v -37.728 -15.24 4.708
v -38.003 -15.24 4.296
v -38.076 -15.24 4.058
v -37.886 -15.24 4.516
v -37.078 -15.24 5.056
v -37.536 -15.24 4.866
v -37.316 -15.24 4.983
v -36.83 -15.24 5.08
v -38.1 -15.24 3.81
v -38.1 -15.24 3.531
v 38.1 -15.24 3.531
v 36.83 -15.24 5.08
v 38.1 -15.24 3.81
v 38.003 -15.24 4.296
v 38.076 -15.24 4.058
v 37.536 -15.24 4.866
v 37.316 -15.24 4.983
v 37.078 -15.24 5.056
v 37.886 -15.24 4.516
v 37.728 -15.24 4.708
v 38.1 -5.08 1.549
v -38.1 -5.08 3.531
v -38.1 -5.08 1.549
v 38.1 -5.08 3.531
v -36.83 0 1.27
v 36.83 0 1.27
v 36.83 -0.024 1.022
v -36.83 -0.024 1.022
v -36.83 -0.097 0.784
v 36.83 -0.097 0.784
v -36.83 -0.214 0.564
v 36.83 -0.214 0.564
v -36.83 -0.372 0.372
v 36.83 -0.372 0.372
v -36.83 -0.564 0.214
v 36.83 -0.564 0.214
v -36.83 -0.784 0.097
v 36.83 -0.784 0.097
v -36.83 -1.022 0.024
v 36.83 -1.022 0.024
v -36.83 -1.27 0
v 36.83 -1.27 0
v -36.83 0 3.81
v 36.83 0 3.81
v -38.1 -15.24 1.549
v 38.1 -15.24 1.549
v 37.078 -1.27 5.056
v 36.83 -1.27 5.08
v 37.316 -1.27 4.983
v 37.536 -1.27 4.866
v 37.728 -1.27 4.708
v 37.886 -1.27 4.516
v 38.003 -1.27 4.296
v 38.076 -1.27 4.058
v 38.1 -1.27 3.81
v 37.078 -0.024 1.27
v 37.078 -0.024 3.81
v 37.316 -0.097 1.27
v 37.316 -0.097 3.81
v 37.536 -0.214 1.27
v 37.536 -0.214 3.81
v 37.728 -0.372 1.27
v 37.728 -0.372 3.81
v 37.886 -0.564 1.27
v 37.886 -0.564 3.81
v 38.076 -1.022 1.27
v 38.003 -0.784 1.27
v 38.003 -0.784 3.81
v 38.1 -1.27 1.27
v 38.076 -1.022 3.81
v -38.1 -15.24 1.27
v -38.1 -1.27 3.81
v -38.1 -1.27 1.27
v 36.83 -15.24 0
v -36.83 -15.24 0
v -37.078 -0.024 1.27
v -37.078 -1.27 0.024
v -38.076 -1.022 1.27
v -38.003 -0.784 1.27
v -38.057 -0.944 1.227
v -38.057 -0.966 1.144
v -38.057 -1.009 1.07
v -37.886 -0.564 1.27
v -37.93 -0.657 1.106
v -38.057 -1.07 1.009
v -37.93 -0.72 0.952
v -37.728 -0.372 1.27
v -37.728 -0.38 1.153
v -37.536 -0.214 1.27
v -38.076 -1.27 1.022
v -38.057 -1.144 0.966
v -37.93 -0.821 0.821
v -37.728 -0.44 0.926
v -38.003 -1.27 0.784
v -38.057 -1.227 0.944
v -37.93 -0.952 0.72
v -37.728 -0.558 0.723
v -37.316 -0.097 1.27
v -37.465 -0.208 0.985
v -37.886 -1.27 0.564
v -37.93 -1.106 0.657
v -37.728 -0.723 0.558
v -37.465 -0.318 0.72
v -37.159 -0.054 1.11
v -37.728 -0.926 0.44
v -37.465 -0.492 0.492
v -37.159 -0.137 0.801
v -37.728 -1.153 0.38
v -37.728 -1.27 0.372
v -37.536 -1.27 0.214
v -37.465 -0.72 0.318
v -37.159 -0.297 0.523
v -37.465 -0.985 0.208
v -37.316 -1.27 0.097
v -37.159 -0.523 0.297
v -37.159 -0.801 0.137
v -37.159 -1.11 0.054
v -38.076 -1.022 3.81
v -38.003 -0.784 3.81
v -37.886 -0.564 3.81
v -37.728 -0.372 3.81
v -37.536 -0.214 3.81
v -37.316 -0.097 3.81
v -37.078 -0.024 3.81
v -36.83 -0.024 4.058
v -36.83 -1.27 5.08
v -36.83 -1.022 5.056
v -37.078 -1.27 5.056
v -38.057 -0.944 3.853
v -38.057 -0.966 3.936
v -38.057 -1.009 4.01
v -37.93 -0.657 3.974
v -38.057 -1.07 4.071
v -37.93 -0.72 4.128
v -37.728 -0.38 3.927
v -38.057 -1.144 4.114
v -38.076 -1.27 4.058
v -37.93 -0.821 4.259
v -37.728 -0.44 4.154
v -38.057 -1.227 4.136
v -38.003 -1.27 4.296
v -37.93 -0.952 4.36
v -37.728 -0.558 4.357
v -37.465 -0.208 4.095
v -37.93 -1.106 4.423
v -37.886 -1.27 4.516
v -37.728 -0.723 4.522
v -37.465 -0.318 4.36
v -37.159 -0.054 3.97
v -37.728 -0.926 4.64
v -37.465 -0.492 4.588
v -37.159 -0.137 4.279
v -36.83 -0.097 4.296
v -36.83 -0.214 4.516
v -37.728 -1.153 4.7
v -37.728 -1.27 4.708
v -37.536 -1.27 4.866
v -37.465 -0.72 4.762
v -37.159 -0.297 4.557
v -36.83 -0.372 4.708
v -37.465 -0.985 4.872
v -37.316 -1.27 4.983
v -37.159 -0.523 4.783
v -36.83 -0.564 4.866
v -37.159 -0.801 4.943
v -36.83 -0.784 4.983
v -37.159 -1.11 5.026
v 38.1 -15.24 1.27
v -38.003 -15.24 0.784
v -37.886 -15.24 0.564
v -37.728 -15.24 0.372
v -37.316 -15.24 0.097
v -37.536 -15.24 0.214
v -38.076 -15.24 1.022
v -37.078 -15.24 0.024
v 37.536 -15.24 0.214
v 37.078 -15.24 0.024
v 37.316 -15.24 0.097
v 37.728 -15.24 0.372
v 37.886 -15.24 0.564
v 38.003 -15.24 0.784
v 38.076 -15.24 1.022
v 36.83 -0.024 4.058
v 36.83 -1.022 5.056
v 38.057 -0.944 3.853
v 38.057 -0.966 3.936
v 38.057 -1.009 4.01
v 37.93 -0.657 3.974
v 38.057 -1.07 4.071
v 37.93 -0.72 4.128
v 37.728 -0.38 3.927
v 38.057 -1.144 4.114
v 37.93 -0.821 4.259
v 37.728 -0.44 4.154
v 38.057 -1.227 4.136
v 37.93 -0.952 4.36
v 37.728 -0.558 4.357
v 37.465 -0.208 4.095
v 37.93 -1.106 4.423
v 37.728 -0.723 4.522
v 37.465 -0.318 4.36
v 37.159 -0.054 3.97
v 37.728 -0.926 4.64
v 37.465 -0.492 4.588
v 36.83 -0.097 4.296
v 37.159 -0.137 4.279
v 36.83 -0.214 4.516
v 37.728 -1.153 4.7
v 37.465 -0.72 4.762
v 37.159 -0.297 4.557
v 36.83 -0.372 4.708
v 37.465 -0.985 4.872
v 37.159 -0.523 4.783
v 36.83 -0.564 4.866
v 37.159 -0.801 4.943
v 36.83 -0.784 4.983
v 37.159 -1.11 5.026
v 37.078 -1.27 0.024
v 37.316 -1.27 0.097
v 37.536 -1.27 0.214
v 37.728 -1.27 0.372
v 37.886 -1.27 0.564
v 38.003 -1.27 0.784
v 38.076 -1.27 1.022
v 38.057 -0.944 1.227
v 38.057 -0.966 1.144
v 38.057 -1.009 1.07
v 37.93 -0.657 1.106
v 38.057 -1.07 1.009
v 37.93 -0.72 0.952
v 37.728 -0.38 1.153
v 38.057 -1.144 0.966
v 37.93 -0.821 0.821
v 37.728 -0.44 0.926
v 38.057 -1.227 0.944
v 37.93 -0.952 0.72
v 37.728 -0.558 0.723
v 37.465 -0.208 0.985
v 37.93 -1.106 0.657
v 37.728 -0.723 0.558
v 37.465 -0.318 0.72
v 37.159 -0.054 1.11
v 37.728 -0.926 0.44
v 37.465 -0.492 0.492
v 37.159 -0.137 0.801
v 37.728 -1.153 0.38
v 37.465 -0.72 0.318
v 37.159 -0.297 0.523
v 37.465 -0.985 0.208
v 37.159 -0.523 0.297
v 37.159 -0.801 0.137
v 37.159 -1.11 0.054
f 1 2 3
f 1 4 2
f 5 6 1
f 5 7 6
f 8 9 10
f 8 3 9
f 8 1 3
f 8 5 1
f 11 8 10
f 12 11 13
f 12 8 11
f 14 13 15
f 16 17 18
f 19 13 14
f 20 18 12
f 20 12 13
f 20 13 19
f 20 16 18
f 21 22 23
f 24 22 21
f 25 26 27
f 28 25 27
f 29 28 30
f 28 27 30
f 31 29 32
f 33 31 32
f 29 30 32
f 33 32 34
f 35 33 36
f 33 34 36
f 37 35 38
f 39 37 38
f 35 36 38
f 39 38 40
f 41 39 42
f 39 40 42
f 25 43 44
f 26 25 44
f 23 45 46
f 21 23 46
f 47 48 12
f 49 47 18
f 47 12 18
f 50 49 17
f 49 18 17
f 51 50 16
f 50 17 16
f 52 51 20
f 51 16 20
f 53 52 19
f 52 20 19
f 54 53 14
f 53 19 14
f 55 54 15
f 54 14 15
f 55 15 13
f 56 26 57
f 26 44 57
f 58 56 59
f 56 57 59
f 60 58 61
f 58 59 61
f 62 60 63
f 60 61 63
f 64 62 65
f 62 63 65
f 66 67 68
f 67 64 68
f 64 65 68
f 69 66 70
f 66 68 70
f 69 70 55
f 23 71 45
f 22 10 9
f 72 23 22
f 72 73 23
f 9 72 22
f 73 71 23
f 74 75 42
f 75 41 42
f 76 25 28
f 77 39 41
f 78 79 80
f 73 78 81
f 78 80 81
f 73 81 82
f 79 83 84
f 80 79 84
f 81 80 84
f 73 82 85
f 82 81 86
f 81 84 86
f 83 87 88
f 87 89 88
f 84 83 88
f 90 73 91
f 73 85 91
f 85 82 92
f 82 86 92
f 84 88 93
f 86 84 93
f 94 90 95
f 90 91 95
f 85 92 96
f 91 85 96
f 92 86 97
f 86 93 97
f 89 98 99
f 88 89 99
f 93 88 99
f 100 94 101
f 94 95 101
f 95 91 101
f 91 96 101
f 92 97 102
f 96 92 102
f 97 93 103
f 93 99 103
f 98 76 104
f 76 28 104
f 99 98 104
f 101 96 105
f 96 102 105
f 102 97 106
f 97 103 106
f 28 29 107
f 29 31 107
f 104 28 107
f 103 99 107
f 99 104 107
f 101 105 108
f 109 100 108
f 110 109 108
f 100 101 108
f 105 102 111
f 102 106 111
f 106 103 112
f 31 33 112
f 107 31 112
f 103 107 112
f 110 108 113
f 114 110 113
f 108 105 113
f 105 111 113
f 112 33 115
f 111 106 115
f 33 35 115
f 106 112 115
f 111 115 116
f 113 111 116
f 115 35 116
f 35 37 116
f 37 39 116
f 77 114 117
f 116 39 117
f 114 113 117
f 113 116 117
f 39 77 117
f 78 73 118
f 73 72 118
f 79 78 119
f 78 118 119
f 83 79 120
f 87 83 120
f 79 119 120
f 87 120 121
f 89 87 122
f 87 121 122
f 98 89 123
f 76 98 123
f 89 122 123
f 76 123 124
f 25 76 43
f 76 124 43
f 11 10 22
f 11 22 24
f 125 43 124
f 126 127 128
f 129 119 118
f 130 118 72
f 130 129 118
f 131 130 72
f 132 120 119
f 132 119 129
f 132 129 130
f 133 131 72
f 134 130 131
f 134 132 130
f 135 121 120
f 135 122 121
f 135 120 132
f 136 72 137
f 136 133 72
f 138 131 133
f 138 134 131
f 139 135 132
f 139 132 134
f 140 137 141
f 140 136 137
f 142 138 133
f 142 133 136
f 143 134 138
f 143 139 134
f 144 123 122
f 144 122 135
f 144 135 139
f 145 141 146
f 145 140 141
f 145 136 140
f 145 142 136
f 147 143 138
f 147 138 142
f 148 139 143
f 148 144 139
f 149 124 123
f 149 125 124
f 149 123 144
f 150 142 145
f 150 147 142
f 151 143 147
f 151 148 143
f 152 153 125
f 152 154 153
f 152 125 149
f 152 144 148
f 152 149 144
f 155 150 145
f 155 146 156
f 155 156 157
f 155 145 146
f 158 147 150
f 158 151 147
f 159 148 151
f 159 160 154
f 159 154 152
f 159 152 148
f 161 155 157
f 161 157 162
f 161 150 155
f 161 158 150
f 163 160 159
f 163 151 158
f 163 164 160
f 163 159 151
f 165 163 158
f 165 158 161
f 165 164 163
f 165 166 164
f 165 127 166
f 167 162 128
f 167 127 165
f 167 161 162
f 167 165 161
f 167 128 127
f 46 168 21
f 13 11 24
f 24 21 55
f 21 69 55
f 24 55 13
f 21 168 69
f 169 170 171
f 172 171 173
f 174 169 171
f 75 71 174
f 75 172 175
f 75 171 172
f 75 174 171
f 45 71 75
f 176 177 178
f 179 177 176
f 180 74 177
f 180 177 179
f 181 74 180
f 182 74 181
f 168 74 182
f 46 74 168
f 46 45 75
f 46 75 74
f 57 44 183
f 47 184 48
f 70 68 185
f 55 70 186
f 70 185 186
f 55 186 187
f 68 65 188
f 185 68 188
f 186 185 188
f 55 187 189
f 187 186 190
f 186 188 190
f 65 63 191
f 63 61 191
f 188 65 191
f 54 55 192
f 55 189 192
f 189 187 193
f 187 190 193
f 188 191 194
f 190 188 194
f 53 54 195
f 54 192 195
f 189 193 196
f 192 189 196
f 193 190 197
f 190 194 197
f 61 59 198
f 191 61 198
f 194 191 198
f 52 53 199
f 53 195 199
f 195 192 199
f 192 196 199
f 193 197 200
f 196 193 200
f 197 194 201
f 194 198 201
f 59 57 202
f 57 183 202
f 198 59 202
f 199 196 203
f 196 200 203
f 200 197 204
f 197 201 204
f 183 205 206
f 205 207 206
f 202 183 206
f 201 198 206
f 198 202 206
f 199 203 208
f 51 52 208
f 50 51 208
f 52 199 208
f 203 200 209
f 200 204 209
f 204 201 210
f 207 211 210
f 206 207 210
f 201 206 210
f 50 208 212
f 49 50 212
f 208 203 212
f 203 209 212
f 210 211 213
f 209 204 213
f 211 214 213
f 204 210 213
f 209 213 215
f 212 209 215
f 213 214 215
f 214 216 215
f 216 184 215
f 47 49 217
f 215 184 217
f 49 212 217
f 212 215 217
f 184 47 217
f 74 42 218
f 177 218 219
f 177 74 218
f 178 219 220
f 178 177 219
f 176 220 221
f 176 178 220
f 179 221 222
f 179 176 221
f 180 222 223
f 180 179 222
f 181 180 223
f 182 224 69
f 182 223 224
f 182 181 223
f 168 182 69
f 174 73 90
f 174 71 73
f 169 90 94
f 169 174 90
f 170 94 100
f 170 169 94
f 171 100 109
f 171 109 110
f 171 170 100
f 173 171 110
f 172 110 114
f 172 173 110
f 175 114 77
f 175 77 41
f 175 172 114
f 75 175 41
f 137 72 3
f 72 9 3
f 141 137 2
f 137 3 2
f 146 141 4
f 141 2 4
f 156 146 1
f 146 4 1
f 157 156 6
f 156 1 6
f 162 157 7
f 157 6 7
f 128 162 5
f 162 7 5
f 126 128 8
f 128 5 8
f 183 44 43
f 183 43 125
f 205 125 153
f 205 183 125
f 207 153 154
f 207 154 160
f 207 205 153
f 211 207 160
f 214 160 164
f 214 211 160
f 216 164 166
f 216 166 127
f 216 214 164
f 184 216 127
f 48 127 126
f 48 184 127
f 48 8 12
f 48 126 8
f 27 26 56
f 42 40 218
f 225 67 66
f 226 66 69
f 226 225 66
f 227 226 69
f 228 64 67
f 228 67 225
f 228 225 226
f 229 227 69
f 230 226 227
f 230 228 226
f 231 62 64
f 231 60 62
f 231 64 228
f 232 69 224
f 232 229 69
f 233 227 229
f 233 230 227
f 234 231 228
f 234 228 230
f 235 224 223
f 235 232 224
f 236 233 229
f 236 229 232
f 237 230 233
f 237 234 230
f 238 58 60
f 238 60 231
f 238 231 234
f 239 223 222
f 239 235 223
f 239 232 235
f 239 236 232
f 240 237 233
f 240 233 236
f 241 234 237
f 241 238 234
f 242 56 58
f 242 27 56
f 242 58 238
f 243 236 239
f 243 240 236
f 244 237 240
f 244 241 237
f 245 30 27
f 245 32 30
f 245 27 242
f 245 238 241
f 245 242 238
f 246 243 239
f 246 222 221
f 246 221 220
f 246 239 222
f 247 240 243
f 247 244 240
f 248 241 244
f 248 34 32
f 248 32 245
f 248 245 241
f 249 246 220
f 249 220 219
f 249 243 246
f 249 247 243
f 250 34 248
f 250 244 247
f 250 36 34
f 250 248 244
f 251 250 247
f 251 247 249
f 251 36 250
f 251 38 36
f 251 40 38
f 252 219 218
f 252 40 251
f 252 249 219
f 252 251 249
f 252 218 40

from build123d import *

# Parameters (mm, degrees)
F0_W     = 76.2
F0_H     = 5.08
F1_DEPTH = 15.24
F2_W     = 76.2
F2_H     = 1.9812
F3_DEPTH = 10.16
F4_R     = 1.27


with BuildPart() as f1:
    # F0 (on Front) → F1 (new body)
    with BuildSketch(Plane.XZ):
        with Locations((0, 2.54)):
            Rectangle(F0_W, F0_H)
    extrude(amount=F1_DEPTH)

    # F2 (on face) → F3 (cut)
    with BuildSketch(Plane.XZ.offset(15.24)):
        with Locations((0, 2.54)):
            Rectangle(F2_W, F2_H)
    extrude(amount=-F3_DEPTH, mode=Mode.SUBTRACT)

    # F4
    f4_edges = [f1.edges().sort_by_distance(p)[0] for p in [
        (0, 0, 5.08),
        (0, 0, 0),
        (-38.1, 0, 2.54),
        (38.1, 0, 2.54),
        (38.1, -7.62, 5.08),
        (38.1, -7.62, 0),
        (-38.1, -7.62, 5.08),
        (-38.1, -7.62, 0),
    ]]
    fillet(f4_edges, radius=F4_R)


solid = f1.part
